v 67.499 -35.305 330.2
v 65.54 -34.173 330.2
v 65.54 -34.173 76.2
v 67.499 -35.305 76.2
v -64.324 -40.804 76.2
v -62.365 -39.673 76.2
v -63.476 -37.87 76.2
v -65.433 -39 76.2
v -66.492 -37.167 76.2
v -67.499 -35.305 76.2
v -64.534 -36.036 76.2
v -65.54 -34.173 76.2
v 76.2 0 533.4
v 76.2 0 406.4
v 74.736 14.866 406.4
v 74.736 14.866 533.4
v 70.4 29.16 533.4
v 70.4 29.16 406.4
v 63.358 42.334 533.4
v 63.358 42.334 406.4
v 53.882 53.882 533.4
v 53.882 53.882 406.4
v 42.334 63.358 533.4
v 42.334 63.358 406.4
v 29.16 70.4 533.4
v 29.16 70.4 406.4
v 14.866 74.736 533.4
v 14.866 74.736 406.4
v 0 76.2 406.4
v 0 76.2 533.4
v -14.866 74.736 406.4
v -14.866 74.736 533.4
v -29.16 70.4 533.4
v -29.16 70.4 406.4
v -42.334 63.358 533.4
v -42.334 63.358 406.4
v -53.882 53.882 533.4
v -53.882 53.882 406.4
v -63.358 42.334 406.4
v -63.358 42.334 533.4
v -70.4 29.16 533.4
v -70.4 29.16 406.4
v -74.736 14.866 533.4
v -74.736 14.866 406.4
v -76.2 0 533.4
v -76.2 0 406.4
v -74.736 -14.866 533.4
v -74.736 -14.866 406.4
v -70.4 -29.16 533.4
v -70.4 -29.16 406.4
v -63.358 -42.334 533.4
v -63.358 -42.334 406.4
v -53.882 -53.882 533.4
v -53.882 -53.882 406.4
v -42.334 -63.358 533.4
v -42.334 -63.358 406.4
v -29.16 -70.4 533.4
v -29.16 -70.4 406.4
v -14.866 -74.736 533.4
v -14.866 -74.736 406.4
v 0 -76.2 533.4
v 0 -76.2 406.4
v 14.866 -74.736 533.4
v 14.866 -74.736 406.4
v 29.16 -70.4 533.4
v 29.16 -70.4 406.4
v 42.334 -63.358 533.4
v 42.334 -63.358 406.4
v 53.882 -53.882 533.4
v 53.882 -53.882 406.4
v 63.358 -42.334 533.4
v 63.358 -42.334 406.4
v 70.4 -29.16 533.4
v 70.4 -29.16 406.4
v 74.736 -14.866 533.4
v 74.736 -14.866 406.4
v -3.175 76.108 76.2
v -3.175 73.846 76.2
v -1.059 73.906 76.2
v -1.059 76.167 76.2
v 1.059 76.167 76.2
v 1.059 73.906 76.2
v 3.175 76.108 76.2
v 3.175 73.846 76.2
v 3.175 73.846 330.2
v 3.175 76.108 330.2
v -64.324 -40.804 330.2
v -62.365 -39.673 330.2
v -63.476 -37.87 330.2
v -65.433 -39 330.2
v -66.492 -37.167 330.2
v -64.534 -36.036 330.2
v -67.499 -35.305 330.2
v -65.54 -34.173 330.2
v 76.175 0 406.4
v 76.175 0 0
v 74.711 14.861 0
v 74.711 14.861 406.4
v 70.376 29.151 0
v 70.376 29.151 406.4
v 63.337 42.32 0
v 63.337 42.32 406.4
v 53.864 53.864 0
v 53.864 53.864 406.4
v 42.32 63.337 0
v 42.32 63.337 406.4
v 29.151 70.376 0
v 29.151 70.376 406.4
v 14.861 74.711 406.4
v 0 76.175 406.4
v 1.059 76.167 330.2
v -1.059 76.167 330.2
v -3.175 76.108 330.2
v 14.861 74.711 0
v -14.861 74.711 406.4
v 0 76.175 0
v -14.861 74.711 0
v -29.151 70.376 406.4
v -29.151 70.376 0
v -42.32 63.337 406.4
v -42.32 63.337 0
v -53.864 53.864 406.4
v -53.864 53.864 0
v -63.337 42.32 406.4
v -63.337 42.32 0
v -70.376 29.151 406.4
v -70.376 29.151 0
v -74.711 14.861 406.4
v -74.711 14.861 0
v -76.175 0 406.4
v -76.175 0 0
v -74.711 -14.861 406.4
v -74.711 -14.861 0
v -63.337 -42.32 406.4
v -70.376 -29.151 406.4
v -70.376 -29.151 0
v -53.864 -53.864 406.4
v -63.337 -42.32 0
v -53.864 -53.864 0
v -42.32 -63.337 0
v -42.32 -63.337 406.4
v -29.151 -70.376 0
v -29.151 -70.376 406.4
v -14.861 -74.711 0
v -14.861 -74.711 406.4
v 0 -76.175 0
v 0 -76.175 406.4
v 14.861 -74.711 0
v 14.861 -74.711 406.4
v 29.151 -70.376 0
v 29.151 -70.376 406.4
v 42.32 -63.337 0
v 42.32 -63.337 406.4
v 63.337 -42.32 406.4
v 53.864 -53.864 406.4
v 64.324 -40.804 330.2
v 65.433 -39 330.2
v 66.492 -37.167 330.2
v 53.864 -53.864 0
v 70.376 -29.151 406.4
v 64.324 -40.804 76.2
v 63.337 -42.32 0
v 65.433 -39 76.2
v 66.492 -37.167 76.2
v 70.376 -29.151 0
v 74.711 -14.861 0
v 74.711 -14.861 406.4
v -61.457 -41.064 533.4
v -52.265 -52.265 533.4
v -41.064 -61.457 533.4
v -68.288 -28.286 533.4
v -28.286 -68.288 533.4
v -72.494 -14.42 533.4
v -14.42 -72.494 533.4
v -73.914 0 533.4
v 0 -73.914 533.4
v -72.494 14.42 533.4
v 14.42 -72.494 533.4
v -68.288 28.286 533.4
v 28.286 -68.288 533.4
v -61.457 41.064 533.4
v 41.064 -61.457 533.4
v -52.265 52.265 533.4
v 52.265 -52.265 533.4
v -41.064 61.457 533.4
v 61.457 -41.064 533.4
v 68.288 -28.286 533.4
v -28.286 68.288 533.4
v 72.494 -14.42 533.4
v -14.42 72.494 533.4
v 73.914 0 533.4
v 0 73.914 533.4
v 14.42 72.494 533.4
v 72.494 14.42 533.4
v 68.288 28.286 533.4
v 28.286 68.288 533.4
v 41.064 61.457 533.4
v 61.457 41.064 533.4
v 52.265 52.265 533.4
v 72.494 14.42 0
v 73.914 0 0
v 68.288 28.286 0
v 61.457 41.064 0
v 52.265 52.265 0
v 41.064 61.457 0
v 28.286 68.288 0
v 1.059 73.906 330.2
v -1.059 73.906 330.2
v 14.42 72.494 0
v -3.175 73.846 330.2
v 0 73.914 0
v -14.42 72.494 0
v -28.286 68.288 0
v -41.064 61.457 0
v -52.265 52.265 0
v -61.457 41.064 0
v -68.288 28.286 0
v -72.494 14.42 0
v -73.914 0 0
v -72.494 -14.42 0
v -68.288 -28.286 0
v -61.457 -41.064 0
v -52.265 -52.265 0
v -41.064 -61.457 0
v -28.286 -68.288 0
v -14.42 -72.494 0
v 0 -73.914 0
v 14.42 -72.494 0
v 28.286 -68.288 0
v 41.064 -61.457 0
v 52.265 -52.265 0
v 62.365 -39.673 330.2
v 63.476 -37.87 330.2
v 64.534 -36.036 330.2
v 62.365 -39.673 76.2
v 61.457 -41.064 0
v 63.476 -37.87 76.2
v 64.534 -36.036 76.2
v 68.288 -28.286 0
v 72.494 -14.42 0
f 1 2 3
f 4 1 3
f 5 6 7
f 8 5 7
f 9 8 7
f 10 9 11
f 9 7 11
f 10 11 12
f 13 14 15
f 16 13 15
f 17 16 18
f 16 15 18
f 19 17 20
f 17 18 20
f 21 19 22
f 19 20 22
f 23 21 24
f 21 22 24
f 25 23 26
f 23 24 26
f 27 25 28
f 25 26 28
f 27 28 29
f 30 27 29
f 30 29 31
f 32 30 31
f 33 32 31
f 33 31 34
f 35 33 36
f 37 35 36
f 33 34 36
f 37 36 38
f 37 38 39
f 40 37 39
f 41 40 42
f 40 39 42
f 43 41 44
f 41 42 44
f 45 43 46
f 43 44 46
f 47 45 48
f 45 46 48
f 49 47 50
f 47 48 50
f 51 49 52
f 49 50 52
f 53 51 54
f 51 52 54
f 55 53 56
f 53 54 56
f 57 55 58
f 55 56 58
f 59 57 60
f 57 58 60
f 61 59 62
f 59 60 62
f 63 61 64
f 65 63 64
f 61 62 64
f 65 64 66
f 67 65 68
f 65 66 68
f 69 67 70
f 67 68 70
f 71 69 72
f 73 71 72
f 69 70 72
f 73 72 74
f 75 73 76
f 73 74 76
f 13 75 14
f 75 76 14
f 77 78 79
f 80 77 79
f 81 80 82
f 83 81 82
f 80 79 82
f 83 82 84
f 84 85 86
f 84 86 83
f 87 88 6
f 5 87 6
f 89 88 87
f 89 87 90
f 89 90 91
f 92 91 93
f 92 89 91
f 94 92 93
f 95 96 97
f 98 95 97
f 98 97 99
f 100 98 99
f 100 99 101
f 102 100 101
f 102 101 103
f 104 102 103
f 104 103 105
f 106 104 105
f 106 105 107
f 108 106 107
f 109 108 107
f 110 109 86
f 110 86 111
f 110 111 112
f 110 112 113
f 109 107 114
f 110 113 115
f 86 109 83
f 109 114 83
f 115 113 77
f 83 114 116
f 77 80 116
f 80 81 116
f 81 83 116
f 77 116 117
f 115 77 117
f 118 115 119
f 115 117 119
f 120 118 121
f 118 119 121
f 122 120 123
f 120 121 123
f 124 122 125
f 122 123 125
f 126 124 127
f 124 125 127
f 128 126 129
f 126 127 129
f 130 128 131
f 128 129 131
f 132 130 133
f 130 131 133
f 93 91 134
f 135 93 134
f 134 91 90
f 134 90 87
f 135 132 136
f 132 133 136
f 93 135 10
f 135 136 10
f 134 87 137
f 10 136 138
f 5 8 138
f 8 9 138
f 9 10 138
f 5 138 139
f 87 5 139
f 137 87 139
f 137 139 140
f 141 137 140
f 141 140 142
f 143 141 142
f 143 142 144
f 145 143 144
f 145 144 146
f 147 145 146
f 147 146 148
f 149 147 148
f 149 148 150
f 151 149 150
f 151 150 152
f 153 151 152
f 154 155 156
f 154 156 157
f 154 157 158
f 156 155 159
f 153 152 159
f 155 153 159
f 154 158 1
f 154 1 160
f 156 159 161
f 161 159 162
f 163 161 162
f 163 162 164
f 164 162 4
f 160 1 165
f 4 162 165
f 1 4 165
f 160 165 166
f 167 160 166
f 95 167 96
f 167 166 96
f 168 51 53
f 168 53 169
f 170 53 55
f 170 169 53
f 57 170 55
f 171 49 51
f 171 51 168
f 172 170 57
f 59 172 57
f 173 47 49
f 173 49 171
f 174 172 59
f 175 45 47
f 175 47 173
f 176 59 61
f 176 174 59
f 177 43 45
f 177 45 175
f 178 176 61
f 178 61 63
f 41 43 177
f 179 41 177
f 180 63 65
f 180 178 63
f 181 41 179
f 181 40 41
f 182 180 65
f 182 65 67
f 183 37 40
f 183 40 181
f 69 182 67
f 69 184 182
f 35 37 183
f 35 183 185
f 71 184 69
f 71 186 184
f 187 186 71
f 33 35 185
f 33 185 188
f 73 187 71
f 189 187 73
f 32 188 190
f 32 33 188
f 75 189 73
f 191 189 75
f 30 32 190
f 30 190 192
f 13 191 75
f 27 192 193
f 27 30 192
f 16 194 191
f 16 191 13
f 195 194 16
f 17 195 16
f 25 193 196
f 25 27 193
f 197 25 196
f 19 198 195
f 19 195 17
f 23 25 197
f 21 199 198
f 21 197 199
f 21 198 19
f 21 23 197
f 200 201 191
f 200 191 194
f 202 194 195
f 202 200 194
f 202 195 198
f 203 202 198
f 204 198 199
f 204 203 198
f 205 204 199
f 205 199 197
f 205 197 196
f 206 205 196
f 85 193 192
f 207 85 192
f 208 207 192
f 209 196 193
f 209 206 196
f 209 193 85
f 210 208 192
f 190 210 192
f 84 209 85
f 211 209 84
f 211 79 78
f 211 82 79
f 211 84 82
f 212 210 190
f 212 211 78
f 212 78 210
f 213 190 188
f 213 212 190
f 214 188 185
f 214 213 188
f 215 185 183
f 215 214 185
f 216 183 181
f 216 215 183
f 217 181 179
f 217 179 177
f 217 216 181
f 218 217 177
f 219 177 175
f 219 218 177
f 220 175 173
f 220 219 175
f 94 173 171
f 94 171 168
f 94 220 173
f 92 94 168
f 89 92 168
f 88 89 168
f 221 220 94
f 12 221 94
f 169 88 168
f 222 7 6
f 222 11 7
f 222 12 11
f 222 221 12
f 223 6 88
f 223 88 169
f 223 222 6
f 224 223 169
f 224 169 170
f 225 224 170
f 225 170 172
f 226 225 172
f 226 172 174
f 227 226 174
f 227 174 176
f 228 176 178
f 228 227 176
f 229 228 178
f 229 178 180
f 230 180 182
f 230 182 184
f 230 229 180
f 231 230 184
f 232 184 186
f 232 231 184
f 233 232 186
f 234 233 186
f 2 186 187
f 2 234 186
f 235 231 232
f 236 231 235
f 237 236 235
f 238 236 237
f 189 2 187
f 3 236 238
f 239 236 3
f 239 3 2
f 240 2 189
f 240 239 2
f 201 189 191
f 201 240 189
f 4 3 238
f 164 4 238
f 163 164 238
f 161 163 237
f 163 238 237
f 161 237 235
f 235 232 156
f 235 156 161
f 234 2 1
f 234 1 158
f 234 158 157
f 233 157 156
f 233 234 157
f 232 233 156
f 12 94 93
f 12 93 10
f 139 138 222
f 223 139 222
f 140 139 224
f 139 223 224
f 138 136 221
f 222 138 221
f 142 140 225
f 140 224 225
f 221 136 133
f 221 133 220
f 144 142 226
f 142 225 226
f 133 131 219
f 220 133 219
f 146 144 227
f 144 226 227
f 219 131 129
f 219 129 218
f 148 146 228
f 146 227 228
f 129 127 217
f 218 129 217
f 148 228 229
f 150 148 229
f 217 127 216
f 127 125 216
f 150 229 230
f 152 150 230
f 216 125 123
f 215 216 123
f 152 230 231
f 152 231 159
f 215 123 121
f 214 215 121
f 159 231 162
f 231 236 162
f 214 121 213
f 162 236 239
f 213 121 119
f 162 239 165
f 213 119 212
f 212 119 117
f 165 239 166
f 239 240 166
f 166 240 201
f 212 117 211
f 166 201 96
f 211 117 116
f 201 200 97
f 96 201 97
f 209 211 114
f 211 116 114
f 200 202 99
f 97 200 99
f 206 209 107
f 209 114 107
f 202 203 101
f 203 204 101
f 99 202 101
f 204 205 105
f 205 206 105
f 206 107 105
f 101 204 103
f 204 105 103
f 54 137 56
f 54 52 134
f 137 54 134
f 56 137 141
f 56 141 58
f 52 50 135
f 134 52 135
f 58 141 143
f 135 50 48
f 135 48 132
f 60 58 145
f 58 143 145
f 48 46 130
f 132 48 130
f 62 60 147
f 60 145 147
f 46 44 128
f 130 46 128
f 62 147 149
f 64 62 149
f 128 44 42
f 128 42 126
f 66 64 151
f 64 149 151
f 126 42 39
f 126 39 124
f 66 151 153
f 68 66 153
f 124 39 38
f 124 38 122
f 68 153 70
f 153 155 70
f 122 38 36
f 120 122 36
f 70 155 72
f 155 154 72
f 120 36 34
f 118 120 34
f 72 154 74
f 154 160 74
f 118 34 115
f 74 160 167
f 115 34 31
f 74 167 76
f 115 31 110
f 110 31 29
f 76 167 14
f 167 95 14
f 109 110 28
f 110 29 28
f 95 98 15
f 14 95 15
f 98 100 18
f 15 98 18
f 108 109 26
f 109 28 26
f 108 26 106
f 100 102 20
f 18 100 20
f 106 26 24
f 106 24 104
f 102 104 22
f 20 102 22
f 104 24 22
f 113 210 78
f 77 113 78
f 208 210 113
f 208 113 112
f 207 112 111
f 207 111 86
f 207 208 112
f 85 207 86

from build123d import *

# Parameters (mm, degrees)
ESQUISSE2_R                  = 76.1746
ESQUISSE2_R_2                = 73.914
BOSS_EXTRU_1_DEPTH           = 406.4
ESQUISSE3_R                  = 76.2
ESQUISSE3_R_2                = 73.914
BOSS_EXTRU_2_DEPTH           = 127
ESQUISSE4_W                  = 6.35
ESQUISSE4_H                  = 254
ENL_V_MAT_EXTRU_1_DEPTH      = 96.774
R_P_TITION_CIRCULAIRE1_COUNT = 3


with BuildPart() as part:
    # Esquisse2 → Boss.-Extru.1 (new body)
    with BuildSketch(Plane.XY):
        Circle(ESQUISSE2_R)
        Circle(ESQUISSE2_R_2, mode=Mode.SUBTRACT)
    extrude(amount=BOSS_EXTRU_1_DEPTH)

    # Esquisse3 → Boss.-Extru.2 (add)
    with BuildSketch(Plane.XY.offset(406.4)):
        Circle(ESQUISSE3_R)
        Circle(ESQUISSE3_R_2, mode=Mode.SUBTRACT)
    extrude(amount=BOSS_EXTRU_2_DEPTH)

    # Esquisse4 → Enlèv. mat.-Extru.1 (cut)
    with BuildSketch(Plane(origin=(0, 0, 0), x_dir=(1, 0, 0), z_dir=(0, 1, 0))):
        with Locations((0, -203.2)):
            Rectangle(ESQUISSE4_W, ESQUISSE4_H)
    enl_v_mat_extru_1 = extrude(amount=ENL_V_MAT_EXTRU_1_DEPTH, mode=Mode.SUBTRACT)

    # Répétition circulaire1: Enlèv. mat.-Extru.1 ×3 about axis
    r_p_tition_circulaire1_axis = Axis((0, 0, 0), (0, 0, 1))
    for i in range(1, R_P_TITION_CIRCULAIRE1_COUNT):
        add(enl_v_mat_extru_1.rotate(r_p_tition_circulaire1_axis, i * 360 / R_P_TITION_CIRCULAIRE1_COUNT), mode=Mode.SUBTRACT)


solid = part.part
